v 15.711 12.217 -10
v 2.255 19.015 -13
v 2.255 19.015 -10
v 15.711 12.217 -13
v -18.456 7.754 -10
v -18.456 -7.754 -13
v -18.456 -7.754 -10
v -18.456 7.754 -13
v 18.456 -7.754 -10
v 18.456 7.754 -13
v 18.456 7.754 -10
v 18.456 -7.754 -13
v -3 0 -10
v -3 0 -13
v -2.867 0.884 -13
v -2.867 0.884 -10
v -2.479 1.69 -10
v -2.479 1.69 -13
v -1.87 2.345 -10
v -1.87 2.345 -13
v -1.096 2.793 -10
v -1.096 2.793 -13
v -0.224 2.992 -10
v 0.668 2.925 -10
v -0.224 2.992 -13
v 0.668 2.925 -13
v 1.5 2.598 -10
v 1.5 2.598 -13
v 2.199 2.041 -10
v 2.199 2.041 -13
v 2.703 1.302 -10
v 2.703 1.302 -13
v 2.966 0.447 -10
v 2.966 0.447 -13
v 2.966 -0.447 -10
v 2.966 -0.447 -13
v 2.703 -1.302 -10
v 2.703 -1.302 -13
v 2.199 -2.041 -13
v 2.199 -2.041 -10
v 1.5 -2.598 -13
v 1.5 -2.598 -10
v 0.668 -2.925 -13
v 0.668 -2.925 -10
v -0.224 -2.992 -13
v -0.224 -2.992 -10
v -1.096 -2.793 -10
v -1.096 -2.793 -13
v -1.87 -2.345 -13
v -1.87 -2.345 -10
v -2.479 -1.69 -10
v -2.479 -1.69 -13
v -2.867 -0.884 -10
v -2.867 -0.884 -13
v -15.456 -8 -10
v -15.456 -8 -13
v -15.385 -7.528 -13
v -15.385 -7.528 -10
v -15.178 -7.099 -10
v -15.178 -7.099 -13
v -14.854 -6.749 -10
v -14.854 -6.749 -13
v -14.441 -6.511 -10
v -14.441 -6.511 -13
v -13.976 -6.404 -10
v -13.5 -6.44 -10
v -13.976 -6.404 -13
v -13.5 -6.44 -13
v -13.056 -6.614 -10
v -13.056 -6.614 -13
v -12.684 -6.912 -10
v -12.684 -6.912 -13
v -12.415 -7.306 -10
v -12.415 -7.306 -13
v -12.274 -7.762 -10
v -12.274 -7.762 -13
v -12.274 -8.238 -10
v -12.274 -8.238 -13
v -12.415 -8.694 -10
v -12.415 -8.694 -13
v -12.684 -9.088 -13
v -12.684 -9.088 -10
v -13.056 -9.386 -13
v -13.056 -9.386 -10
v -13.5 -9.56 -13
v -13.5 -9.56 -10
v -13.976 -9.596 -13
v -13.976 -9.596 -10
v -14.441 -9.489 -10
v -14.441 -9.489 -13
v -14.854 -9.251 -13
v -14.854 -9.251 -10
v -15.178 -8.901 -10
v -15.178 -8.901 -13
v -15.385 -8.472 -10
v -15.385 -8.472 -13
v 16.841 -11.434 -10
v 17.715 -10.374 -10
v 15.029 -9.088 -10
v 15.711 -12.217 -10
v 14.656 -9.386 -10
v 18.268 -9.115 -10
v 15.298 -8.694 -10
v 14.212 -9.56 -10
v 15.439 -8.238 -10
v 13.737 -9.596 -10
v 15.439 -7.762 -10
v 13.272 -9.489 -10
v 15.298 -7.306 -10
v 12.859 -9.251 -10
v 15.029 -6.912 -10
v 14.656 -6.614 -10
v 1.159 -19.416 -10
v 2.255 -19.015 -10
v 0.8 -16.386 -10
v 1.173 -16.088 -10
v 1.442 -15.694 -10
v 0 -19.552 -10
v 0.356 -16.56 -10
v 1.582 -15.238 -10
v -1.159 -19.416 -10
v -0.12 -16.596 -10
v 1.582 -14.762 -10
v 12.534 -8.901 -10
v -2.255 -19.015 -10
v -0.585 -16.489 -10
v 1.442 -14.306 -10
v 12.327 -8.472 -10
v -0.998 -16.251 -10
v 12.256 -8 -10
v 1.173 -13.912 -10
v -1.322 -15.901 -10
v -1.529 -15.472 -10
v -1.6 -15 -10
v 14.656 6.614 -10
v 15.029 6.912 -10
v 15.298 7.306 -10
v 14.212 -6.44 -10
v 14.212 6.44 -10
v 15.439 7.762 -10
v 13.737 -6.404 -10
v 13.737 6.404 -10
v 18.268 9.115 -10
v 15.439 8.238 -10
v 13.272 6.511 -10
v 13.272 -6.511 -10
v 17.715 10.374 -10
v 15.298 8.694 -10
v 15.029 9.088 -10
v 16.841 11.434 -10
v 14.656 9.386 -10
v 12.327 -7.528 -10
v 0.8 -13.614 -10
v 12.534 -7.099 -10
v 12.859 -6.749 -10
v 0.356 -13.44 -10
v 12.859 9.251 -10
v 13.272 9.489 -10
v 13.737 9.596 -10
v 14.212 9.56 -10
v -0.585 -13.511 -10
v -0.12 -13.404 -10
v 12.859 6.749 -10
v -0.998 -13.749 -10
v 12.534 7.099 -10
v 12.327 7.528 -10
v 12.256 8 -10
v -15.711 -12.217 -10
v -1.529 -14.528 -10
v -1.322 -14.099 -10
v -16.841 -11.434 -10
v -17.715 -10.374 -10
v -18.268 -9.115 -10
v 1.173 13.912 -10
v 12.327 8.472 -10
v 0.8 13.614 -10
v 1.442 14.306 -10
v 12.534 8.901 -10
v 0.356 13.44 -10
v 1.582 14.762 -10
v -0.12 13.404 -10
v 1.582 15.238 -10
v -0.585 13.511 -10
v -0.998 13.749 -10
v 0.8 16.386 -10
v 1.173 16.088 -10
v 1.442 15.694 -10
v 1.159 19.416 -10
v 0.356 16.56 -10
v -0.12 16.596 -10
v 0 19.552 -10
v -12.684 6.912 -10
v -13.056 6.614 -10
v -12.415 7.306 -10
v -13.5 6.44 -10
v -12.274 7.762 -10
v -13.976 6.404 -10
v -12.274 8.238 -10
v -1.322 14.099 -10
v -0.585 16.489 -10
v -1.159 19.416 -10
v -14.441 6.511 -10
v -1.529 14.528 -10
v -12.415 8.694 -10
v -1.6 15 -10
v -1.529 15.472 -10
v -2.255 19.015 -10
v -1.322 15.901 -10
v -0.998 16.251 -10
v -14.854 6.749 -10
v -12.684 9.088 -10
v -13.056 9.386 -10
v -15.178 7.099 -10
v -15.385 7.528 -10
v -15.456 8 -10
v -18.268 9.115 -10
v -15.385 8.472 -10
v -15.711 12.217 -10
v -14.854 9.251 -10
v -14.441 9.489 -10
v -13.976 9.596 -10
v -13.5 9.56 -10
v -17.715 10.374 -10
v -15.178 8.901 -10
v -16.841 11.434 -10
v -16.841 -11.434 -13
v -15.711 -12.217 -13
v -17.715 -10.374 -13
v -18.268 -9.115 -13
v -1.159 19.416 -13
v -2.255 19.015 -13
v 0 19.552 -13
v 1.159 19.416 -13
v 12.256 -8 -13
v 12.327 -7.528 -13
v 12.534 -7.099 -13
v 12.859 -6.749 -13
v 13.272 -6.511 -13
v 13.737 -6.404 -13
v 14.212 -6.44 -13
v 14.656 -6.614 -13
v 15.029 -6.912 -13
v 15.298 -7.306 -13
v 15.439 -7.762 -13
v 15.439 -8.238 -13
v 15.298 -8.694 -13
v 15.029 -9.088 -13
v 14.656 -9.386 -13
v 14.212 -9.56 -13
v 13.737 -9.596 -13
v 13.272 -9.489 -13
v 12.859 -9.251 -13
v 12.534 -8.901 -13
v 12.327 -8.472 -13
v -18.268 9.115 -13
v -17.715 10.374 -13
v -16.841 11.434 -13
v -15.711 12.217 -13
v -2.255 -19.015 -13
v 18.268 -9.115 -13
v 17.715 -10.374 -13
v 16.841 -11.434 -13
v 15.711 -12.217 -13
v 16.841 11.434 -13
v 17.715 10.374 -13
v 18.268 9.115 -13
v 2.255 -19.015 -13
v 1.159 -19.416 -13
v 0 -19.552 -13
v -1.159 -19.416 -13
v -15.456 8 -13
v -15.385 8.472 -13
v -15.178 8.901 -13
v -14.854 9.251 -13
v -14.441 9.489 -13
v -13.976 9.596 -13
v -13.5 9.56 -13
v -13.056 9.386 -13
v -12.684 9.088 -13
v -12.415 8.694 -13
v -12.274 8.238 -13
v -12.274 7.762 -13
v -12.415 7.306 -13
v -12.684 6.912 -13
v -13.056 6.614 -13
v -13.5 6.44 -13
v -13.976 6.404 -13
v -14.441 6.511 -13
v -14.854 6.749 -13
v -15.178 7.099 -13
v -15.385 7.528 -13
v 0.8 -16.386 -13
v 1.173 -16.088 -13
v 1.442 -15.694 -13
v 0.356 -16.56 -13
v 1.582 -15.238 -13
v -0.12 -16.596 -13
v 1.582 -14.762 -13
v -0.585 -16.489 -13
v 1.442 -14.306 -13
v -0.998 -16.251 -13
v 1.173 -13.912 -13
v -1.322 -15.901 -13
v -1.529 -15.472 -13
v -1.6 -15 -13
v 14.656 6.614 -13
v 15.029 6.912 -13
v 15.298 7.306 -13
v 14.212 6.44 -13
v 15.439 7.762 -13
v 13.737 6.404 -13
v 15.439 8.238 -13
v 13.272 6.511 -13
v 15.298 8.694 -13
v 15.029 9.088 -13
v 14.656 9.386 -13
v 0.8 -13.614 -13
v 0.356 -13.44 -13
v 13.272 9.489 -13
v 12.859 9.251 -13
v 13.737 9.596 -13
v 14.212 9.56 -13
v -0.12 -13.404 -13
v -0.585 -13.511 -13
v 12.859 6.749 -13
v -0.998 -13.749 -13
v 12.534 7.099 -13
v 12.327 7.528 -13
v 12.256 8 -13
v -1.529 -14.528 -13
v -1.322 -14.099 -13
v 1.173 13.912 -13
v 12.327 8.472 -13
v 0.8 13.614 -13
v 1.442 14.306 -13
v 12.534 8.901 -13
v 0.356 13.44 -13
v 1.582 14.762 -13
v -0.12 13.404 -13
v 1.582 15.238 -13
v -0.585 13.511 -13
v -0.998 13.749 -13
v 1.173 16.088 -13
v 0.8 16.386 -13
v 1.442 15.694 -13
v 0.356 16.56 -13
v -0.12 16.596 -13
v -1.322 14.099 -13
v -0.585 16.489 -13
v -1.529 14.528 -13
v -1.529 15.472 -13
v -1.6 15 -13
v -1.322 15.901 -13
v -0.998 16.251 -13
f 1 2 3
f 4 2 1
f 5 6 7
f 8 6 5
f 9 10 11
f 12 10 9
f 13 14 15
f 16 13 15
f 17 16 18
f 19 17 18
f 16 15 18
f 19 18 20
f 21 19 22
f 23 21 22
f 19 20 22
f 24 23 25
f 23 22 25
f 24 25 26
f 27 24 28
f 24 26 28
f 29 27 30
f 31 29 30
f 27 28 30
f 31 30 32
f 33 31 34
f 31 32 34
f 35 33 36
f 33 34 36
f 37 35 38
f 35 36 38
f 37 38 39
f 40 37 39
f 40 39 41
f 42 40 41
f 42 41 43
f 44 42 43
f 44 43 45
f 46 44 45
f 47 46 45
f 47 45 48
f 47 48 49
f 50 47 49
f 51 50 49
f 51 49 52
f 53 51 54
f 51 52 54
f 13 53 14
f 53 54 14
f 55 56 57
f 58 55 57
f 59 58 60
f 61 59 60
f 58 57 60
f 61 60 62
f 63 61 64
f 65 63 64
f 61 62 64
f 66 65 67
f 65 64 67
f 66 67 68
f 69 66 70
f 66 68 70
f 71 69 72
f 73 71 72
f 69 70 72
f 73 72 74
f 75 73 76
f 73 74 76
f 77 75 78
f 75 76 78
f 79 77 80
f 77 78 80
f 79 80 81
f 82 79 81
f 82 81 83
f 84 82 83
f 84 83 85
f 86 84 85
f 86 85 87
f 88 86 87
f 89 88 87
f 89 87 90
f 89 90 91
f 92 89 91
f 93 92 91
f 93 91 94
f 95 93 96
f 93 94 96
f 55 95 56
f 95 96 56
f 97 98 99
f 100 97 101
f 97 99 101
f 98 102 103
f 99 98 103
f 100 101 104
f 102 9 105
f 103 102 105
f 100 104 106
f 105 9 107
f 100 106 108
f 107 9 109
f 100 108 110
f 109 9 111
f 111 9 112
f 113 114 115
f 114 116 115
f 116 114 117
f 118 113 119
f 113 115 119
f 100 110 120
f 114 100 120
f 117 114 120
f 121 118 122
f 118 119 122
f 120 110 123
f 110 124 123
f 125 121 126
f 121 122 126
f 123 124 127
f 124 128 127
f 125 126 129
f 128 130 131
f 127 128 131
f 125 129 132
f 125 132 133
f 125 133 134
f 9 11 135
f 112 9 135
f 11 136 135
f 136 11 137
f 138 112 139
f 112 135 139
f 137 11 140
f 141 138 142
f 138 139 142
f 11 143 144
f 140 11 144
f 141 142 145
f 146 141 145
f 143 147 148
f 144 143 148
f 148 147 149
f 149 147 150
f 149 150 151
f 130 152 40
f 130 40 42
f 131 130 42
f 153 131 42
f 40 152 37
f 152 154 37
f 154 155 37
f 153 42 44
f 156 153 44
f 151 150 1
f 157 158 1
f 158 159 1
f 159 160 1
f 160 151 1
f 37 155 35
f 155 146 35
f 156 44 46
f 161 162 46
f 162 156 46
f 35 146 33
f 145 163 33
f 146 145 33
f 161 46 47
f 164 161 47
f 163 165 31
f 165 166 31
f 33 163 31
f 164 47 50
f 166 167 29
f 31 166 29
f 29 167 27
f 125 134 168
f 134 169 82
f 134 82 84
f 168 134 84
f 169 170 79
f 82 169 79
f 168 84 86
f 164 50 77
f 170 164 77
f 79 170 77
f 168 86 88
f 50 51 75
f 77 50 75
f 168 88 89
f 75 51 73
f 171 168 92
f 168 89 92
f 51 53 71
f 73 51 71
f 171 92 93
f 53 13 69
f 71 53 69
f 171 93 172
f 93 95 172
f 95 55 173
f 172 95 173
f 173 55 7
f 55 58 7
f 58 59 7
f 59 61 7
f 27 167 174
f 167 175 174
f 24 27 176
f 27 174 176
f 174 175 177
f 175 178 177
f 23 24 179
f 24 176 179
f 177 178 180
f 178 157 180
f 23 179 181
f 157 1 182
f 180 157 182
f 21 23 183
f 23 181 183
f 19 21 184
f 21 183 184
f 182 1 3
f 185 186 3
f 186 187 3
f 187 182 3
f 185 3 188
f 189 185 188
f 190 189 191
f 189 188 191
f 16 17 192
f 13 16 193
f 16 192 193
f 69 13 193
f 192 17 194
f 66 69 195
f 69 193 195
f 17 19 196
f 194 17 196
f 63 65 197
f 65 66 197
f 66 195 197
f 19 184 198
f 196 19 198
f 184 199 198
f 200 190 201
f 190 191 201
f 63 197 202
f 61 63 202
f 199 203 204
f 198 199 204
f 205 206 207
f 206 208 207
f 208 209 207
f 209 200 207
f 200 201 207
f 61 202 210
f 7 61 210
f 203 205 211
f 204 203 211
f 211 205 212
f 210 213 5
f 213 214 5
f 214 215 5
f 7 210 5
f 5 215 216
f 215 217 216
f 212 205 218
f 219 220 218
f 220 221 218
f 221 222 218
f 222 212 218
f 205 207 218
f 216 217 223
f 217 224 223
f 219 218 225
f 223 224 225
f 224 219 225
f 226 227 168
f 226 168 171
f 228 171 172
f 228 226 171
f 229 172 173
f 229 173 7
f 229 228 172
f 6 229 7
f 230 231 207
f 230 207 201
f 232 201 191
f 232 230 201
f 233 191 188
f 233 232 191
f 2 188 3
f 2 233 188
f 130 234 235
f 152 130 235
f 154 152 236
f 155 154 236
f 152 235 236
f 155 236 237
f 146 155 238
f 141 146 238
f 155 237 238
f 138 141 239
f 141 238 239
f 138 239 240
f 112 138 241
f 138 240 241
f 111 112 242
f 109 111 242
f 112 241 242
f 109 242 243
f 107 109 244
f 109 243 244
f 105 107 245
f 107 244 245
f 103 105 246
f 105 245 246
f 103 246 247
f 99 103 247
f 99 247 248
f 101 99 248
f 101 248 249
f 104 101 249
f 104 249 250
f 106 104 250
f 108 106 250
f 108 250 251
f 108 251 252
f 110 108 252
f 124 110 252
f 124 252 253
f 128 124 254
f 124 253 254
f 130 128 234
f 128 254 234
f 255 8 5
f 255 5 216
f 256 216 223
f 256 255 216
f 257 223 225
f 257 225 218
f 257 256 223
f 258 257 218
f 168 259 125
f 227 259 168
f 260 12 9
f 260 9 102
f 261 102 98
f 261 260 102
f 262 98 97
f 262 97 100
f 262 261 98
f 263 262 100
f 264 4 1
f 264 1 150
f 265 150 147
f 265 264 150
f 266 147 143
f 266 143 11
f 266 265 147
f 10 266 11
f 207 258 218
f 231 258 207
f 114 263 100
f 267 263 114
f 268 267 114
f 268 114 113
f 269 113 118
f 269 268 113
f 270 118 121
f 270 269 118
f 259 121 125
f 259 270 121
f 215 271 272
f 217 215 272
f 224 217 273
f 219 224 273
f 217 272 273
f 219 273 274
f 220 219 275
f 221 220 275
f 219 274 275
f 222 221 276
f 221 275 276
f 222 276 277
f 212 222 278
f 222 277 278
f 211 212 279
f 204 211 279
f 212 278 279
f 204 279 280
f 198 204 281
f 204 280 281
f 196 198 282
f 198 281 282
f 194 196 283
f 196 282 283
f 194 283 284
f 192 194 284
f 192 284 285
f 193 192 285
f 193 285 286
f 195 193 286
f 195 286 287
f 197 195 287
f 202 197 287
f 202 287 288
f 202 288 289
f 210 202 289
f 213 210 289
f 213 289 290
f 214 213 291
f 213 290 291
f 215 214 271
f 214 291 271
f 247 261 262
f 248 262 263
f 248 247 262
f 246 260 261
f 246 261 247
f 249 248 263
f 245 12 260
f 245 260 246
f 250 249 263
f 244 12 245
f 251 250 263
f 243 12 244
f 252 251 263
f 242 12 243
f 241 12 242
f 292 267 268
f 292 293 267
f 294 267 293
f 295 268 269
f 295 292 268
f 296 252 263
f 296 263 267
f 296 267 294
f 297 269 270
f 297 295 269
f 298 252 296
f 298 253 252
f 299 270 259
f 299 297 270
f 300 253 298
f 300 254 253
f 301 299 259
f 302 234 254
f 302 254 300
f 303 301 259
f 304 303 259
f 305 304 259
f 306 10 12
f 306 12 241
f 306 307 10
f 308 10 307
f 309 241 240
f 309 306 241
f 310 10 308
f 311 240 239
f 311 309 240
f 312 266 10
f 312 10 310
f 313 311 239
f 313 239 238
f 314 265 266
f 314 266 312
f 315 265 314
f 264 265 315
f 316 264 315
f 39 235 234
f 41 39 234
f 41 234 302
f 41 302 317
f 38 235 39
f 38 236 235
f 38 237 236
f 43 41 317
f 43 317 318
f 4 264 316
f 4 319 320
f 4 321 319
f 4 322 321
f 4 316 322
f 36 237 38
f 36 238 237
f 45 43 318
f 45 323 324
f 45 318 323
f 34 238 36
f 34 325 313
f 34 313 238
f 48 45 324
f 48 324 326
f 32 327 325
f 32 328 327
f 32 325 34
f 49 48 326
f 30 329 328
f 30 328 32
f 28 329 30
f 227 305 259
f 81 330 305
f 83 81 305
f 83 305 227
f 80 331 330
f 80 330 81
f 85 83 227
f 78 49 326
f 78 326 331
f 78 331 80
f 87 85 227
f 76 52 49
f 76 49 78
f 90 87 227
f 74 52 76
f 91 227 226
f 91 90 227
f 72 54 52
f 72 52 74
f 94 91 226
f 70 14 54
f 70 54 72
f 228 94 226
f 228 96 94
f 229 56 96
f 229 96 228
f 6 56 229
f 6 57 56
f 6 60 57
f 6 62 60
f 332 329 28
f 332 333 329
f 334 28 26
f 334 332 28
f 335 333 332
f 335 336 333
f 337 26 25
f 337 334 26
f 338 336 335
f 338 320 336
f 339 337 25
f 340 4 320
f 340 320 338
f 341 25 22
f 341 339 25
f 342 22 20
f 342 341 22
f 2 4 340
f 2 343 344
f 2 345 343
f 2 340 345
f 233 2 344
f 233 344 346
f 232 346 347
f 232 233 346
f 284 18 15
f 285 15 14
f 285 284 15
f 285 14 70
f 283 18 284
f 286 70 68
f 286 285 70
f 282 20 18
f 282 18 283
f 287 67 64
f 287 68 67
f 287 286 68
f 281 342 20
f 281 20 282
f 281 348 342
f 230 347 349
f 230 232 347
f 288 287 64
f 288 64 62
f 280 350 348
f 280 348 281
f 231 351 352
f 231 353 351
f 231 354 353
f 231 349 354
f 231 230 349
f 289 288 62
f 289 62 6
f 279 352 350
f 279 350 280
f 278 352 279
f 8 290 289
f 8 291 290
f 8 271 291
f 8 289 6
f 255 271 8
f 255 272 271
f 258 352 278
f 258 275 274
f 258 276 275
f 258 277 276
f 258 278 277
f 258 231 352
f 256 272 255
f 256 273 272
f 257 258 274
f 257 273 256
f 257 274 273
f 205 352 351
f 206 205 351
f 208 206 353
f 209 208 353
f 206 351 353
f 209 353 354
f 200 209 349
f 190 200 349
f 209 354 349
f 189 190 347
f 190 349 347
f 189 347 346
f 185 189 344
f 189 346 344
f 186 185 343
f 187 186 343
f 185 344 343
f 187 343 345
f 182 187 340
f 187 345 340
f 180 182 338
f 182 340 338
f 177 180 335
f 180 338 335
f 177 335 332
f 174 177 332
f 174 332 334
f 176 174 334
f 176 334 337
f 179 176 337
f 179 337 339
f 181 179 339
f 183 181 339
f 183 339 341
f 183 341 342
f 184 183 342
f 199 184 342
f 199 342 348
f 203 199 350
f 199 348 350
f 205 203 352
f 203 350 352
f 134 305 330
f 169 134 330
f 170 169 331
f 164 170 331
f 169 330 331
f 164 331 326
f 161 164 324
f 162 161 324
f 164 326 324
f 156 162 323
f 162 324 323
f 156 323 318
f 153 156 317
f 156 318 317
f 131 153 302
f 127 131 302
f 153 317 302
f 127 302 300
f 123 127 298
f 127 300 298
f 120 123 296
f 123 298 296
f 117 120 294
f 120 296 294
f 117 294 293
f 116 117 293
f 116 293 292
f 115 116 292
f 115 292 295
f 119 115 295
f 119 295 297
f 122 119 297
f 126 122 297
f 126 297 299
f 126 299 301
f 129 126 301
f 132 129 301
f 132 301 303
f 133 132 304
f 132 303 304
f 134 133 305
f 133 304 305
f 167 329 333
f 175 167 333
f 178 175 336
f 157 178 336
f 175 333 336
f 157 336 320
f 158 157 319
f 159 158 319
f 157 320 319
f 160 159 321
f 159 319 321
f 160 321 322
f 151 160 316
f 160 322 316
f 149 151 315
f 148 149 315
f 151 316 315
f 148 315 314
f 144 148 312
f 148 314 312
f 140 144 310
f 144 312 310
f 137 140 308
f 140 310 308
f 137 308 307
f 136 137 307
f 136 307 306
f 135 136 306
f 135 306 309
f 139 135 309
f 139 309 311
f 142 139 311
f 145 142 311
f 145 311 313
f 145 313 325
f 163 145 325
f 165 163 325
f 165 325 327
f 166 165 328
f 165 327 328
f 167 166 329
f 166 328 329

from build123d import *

# Parameters (mm, degrees)
ESBO_O1_R                = 1.6
ESBO_O1_R_2              = 3
RESSALTO_EXTRUS_O1_DEPTH = 3


with BuildPart() as part:
    # Esboço1 → Ressalto-extrusão1 (new body)
    with BuildSketch(Plane(origin=(0, 0, -13), x_dir=(-1, 0, 0), z_dir=(0, 0, -1))):
        with BuildLine():
            Line((-18.456405, 7.753928284), (-18.456405, -7.753928284))
            ThreePointArc((-18.456405, -7.753928284), (-17.715086833, -10.373781151), (-15.710953382, -12.216776208))
            Line((-15.710953382, -12.216776208), (-2.254548382, -19.014703593))
            ThreePointArc((-2.254548382, -19.014703593), (0, -19.551855668), (2.254548382, -19.014703593))
            Line((2.254548382, -19.014703593), (15.710953382, -12.216776208))
            ThreePointArc((15.710953382, -12.216776208), (17.715086833, -10.373781151), (18.456405, -7.753928284))
            Line((18.456405, -7.753928284), (18.456405, 7.753928284))
            ThreePointArc((18.456405, 7.753928284), (17.715086833, 10.373781151), (15.710953382, 12.216776208))
            Line((15.710953382, 12.216776208), (2.254548382, 19.014703593))
            ThreePointArc((2.254548382, 19.014703593), (0, 19.551855668), (-2.254548382, 19.014703593))
            Line((-2.254548382, 19.014703593), (-15.710953382, 12.216776208))
            ThreePointArc((-15.710953382, 12.216776208), (-17.715086833, 10.373781151), (-18.456405, 7.753928284))
        make_face()
        with Locations((13.856405, -8)):
            Circle(ESBO_O1_R, mode=Mode.SUBTRACT)
        with Locations((-13.856405, 8)):
            Circle(ESBO_O1_R, mode=Mode.SUBTRACT)
        with Locations((13.856405, 8)):
            Circle(ESBO_O1_R, mode=Mode.SUBTRACT)
        Circle(ESBO_O1_R_2, mode=Mode.SUBTRACT)
        with Locations((0, 15)):
            Circle(ESBO_O1_R, mode=Mode.SUBTRACT)
        with Locations((-13.856405, -8)):
            Circle(ESBO_O1_R, mode=Mode.SUBTRACT)
        with Locations((0, -15)):
            Circle(ESBO_O1_R, mode=Mode.SUBTRACT)
    extrude(amount=-RESSALTO_EXTRUS_O1_DEPTH)


solid = part.part
